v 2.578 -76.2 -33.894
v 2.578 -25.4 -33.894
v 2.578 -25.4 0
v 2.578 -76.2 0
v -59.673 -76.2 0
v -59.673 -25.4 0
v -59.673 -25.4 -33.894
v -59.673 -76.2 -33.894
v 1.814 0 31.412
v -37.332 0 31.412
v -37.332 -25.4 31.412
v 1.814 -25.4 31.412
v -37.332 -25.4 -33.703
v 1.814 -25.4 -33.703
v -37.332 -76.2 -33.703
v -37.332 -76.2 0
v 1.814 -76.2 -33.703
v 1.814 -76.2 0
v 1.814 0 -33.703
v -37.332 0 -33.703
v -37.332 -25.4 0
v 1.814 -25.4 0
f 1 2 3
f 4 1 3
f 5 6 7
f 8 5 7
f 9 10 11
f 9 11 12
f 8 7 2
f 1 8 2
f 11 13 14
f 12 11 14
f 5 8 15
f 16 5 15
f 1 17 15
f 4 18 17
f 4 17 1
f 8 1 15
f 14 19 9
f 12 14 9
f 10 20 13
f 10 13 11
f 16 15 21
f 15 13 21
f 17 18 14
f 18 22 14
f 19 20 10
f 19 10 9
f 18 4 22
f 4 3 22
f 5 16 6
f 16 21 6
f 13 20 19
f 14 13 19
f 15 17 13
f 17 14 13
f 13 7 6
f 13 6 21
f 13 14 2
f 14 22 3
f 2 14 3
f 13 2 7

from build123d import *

# Parameters (mm, degrees)
F0_W     = 39.1457030782
F0_H     = 65.1155374944
F1_DEPTH = 25.4
F4_DEPTH = 25.4
F5_DEPTH = 25.4


with BuildPart() as f1:
    # F0 (on Front) → F1 (new body)
    with BuildSketch(Plane.XZ):
        with Locations((-17.7587817307, -1.1457260698)):
            Rectangle(F0_W, F0_H)
    extrude(amount=F1_DEPTH)


with BuildPart() as f4:
    # F3 (on face) → F4 (new body)
    with BuildSketch(Plane.XZ.offset(25.4)):
        Polygon((2.5778883137, -33.8944494724), (2.5778883137, 0), (1.8140698085, 0), (1.8140698085, -33.703494817), (-37.3316332698, -33.703494817), (-37.3316332698, 0), (-59.6733279526, 0), (-59.6733279526, -33.8944494724), align=None)
    extrude(amount=F4_DEPTH)

    # F5 (add): a face of the model
    f5_faces = [f4.faces().sort_by_distance(p)[0] for p in [
        (-46.5516742238, -50.8, -17.1065517655),
    ]]
    extrude(f5_faces, amount=F5_DEPTH)


solid = Compound([f1.part, f4.part])
